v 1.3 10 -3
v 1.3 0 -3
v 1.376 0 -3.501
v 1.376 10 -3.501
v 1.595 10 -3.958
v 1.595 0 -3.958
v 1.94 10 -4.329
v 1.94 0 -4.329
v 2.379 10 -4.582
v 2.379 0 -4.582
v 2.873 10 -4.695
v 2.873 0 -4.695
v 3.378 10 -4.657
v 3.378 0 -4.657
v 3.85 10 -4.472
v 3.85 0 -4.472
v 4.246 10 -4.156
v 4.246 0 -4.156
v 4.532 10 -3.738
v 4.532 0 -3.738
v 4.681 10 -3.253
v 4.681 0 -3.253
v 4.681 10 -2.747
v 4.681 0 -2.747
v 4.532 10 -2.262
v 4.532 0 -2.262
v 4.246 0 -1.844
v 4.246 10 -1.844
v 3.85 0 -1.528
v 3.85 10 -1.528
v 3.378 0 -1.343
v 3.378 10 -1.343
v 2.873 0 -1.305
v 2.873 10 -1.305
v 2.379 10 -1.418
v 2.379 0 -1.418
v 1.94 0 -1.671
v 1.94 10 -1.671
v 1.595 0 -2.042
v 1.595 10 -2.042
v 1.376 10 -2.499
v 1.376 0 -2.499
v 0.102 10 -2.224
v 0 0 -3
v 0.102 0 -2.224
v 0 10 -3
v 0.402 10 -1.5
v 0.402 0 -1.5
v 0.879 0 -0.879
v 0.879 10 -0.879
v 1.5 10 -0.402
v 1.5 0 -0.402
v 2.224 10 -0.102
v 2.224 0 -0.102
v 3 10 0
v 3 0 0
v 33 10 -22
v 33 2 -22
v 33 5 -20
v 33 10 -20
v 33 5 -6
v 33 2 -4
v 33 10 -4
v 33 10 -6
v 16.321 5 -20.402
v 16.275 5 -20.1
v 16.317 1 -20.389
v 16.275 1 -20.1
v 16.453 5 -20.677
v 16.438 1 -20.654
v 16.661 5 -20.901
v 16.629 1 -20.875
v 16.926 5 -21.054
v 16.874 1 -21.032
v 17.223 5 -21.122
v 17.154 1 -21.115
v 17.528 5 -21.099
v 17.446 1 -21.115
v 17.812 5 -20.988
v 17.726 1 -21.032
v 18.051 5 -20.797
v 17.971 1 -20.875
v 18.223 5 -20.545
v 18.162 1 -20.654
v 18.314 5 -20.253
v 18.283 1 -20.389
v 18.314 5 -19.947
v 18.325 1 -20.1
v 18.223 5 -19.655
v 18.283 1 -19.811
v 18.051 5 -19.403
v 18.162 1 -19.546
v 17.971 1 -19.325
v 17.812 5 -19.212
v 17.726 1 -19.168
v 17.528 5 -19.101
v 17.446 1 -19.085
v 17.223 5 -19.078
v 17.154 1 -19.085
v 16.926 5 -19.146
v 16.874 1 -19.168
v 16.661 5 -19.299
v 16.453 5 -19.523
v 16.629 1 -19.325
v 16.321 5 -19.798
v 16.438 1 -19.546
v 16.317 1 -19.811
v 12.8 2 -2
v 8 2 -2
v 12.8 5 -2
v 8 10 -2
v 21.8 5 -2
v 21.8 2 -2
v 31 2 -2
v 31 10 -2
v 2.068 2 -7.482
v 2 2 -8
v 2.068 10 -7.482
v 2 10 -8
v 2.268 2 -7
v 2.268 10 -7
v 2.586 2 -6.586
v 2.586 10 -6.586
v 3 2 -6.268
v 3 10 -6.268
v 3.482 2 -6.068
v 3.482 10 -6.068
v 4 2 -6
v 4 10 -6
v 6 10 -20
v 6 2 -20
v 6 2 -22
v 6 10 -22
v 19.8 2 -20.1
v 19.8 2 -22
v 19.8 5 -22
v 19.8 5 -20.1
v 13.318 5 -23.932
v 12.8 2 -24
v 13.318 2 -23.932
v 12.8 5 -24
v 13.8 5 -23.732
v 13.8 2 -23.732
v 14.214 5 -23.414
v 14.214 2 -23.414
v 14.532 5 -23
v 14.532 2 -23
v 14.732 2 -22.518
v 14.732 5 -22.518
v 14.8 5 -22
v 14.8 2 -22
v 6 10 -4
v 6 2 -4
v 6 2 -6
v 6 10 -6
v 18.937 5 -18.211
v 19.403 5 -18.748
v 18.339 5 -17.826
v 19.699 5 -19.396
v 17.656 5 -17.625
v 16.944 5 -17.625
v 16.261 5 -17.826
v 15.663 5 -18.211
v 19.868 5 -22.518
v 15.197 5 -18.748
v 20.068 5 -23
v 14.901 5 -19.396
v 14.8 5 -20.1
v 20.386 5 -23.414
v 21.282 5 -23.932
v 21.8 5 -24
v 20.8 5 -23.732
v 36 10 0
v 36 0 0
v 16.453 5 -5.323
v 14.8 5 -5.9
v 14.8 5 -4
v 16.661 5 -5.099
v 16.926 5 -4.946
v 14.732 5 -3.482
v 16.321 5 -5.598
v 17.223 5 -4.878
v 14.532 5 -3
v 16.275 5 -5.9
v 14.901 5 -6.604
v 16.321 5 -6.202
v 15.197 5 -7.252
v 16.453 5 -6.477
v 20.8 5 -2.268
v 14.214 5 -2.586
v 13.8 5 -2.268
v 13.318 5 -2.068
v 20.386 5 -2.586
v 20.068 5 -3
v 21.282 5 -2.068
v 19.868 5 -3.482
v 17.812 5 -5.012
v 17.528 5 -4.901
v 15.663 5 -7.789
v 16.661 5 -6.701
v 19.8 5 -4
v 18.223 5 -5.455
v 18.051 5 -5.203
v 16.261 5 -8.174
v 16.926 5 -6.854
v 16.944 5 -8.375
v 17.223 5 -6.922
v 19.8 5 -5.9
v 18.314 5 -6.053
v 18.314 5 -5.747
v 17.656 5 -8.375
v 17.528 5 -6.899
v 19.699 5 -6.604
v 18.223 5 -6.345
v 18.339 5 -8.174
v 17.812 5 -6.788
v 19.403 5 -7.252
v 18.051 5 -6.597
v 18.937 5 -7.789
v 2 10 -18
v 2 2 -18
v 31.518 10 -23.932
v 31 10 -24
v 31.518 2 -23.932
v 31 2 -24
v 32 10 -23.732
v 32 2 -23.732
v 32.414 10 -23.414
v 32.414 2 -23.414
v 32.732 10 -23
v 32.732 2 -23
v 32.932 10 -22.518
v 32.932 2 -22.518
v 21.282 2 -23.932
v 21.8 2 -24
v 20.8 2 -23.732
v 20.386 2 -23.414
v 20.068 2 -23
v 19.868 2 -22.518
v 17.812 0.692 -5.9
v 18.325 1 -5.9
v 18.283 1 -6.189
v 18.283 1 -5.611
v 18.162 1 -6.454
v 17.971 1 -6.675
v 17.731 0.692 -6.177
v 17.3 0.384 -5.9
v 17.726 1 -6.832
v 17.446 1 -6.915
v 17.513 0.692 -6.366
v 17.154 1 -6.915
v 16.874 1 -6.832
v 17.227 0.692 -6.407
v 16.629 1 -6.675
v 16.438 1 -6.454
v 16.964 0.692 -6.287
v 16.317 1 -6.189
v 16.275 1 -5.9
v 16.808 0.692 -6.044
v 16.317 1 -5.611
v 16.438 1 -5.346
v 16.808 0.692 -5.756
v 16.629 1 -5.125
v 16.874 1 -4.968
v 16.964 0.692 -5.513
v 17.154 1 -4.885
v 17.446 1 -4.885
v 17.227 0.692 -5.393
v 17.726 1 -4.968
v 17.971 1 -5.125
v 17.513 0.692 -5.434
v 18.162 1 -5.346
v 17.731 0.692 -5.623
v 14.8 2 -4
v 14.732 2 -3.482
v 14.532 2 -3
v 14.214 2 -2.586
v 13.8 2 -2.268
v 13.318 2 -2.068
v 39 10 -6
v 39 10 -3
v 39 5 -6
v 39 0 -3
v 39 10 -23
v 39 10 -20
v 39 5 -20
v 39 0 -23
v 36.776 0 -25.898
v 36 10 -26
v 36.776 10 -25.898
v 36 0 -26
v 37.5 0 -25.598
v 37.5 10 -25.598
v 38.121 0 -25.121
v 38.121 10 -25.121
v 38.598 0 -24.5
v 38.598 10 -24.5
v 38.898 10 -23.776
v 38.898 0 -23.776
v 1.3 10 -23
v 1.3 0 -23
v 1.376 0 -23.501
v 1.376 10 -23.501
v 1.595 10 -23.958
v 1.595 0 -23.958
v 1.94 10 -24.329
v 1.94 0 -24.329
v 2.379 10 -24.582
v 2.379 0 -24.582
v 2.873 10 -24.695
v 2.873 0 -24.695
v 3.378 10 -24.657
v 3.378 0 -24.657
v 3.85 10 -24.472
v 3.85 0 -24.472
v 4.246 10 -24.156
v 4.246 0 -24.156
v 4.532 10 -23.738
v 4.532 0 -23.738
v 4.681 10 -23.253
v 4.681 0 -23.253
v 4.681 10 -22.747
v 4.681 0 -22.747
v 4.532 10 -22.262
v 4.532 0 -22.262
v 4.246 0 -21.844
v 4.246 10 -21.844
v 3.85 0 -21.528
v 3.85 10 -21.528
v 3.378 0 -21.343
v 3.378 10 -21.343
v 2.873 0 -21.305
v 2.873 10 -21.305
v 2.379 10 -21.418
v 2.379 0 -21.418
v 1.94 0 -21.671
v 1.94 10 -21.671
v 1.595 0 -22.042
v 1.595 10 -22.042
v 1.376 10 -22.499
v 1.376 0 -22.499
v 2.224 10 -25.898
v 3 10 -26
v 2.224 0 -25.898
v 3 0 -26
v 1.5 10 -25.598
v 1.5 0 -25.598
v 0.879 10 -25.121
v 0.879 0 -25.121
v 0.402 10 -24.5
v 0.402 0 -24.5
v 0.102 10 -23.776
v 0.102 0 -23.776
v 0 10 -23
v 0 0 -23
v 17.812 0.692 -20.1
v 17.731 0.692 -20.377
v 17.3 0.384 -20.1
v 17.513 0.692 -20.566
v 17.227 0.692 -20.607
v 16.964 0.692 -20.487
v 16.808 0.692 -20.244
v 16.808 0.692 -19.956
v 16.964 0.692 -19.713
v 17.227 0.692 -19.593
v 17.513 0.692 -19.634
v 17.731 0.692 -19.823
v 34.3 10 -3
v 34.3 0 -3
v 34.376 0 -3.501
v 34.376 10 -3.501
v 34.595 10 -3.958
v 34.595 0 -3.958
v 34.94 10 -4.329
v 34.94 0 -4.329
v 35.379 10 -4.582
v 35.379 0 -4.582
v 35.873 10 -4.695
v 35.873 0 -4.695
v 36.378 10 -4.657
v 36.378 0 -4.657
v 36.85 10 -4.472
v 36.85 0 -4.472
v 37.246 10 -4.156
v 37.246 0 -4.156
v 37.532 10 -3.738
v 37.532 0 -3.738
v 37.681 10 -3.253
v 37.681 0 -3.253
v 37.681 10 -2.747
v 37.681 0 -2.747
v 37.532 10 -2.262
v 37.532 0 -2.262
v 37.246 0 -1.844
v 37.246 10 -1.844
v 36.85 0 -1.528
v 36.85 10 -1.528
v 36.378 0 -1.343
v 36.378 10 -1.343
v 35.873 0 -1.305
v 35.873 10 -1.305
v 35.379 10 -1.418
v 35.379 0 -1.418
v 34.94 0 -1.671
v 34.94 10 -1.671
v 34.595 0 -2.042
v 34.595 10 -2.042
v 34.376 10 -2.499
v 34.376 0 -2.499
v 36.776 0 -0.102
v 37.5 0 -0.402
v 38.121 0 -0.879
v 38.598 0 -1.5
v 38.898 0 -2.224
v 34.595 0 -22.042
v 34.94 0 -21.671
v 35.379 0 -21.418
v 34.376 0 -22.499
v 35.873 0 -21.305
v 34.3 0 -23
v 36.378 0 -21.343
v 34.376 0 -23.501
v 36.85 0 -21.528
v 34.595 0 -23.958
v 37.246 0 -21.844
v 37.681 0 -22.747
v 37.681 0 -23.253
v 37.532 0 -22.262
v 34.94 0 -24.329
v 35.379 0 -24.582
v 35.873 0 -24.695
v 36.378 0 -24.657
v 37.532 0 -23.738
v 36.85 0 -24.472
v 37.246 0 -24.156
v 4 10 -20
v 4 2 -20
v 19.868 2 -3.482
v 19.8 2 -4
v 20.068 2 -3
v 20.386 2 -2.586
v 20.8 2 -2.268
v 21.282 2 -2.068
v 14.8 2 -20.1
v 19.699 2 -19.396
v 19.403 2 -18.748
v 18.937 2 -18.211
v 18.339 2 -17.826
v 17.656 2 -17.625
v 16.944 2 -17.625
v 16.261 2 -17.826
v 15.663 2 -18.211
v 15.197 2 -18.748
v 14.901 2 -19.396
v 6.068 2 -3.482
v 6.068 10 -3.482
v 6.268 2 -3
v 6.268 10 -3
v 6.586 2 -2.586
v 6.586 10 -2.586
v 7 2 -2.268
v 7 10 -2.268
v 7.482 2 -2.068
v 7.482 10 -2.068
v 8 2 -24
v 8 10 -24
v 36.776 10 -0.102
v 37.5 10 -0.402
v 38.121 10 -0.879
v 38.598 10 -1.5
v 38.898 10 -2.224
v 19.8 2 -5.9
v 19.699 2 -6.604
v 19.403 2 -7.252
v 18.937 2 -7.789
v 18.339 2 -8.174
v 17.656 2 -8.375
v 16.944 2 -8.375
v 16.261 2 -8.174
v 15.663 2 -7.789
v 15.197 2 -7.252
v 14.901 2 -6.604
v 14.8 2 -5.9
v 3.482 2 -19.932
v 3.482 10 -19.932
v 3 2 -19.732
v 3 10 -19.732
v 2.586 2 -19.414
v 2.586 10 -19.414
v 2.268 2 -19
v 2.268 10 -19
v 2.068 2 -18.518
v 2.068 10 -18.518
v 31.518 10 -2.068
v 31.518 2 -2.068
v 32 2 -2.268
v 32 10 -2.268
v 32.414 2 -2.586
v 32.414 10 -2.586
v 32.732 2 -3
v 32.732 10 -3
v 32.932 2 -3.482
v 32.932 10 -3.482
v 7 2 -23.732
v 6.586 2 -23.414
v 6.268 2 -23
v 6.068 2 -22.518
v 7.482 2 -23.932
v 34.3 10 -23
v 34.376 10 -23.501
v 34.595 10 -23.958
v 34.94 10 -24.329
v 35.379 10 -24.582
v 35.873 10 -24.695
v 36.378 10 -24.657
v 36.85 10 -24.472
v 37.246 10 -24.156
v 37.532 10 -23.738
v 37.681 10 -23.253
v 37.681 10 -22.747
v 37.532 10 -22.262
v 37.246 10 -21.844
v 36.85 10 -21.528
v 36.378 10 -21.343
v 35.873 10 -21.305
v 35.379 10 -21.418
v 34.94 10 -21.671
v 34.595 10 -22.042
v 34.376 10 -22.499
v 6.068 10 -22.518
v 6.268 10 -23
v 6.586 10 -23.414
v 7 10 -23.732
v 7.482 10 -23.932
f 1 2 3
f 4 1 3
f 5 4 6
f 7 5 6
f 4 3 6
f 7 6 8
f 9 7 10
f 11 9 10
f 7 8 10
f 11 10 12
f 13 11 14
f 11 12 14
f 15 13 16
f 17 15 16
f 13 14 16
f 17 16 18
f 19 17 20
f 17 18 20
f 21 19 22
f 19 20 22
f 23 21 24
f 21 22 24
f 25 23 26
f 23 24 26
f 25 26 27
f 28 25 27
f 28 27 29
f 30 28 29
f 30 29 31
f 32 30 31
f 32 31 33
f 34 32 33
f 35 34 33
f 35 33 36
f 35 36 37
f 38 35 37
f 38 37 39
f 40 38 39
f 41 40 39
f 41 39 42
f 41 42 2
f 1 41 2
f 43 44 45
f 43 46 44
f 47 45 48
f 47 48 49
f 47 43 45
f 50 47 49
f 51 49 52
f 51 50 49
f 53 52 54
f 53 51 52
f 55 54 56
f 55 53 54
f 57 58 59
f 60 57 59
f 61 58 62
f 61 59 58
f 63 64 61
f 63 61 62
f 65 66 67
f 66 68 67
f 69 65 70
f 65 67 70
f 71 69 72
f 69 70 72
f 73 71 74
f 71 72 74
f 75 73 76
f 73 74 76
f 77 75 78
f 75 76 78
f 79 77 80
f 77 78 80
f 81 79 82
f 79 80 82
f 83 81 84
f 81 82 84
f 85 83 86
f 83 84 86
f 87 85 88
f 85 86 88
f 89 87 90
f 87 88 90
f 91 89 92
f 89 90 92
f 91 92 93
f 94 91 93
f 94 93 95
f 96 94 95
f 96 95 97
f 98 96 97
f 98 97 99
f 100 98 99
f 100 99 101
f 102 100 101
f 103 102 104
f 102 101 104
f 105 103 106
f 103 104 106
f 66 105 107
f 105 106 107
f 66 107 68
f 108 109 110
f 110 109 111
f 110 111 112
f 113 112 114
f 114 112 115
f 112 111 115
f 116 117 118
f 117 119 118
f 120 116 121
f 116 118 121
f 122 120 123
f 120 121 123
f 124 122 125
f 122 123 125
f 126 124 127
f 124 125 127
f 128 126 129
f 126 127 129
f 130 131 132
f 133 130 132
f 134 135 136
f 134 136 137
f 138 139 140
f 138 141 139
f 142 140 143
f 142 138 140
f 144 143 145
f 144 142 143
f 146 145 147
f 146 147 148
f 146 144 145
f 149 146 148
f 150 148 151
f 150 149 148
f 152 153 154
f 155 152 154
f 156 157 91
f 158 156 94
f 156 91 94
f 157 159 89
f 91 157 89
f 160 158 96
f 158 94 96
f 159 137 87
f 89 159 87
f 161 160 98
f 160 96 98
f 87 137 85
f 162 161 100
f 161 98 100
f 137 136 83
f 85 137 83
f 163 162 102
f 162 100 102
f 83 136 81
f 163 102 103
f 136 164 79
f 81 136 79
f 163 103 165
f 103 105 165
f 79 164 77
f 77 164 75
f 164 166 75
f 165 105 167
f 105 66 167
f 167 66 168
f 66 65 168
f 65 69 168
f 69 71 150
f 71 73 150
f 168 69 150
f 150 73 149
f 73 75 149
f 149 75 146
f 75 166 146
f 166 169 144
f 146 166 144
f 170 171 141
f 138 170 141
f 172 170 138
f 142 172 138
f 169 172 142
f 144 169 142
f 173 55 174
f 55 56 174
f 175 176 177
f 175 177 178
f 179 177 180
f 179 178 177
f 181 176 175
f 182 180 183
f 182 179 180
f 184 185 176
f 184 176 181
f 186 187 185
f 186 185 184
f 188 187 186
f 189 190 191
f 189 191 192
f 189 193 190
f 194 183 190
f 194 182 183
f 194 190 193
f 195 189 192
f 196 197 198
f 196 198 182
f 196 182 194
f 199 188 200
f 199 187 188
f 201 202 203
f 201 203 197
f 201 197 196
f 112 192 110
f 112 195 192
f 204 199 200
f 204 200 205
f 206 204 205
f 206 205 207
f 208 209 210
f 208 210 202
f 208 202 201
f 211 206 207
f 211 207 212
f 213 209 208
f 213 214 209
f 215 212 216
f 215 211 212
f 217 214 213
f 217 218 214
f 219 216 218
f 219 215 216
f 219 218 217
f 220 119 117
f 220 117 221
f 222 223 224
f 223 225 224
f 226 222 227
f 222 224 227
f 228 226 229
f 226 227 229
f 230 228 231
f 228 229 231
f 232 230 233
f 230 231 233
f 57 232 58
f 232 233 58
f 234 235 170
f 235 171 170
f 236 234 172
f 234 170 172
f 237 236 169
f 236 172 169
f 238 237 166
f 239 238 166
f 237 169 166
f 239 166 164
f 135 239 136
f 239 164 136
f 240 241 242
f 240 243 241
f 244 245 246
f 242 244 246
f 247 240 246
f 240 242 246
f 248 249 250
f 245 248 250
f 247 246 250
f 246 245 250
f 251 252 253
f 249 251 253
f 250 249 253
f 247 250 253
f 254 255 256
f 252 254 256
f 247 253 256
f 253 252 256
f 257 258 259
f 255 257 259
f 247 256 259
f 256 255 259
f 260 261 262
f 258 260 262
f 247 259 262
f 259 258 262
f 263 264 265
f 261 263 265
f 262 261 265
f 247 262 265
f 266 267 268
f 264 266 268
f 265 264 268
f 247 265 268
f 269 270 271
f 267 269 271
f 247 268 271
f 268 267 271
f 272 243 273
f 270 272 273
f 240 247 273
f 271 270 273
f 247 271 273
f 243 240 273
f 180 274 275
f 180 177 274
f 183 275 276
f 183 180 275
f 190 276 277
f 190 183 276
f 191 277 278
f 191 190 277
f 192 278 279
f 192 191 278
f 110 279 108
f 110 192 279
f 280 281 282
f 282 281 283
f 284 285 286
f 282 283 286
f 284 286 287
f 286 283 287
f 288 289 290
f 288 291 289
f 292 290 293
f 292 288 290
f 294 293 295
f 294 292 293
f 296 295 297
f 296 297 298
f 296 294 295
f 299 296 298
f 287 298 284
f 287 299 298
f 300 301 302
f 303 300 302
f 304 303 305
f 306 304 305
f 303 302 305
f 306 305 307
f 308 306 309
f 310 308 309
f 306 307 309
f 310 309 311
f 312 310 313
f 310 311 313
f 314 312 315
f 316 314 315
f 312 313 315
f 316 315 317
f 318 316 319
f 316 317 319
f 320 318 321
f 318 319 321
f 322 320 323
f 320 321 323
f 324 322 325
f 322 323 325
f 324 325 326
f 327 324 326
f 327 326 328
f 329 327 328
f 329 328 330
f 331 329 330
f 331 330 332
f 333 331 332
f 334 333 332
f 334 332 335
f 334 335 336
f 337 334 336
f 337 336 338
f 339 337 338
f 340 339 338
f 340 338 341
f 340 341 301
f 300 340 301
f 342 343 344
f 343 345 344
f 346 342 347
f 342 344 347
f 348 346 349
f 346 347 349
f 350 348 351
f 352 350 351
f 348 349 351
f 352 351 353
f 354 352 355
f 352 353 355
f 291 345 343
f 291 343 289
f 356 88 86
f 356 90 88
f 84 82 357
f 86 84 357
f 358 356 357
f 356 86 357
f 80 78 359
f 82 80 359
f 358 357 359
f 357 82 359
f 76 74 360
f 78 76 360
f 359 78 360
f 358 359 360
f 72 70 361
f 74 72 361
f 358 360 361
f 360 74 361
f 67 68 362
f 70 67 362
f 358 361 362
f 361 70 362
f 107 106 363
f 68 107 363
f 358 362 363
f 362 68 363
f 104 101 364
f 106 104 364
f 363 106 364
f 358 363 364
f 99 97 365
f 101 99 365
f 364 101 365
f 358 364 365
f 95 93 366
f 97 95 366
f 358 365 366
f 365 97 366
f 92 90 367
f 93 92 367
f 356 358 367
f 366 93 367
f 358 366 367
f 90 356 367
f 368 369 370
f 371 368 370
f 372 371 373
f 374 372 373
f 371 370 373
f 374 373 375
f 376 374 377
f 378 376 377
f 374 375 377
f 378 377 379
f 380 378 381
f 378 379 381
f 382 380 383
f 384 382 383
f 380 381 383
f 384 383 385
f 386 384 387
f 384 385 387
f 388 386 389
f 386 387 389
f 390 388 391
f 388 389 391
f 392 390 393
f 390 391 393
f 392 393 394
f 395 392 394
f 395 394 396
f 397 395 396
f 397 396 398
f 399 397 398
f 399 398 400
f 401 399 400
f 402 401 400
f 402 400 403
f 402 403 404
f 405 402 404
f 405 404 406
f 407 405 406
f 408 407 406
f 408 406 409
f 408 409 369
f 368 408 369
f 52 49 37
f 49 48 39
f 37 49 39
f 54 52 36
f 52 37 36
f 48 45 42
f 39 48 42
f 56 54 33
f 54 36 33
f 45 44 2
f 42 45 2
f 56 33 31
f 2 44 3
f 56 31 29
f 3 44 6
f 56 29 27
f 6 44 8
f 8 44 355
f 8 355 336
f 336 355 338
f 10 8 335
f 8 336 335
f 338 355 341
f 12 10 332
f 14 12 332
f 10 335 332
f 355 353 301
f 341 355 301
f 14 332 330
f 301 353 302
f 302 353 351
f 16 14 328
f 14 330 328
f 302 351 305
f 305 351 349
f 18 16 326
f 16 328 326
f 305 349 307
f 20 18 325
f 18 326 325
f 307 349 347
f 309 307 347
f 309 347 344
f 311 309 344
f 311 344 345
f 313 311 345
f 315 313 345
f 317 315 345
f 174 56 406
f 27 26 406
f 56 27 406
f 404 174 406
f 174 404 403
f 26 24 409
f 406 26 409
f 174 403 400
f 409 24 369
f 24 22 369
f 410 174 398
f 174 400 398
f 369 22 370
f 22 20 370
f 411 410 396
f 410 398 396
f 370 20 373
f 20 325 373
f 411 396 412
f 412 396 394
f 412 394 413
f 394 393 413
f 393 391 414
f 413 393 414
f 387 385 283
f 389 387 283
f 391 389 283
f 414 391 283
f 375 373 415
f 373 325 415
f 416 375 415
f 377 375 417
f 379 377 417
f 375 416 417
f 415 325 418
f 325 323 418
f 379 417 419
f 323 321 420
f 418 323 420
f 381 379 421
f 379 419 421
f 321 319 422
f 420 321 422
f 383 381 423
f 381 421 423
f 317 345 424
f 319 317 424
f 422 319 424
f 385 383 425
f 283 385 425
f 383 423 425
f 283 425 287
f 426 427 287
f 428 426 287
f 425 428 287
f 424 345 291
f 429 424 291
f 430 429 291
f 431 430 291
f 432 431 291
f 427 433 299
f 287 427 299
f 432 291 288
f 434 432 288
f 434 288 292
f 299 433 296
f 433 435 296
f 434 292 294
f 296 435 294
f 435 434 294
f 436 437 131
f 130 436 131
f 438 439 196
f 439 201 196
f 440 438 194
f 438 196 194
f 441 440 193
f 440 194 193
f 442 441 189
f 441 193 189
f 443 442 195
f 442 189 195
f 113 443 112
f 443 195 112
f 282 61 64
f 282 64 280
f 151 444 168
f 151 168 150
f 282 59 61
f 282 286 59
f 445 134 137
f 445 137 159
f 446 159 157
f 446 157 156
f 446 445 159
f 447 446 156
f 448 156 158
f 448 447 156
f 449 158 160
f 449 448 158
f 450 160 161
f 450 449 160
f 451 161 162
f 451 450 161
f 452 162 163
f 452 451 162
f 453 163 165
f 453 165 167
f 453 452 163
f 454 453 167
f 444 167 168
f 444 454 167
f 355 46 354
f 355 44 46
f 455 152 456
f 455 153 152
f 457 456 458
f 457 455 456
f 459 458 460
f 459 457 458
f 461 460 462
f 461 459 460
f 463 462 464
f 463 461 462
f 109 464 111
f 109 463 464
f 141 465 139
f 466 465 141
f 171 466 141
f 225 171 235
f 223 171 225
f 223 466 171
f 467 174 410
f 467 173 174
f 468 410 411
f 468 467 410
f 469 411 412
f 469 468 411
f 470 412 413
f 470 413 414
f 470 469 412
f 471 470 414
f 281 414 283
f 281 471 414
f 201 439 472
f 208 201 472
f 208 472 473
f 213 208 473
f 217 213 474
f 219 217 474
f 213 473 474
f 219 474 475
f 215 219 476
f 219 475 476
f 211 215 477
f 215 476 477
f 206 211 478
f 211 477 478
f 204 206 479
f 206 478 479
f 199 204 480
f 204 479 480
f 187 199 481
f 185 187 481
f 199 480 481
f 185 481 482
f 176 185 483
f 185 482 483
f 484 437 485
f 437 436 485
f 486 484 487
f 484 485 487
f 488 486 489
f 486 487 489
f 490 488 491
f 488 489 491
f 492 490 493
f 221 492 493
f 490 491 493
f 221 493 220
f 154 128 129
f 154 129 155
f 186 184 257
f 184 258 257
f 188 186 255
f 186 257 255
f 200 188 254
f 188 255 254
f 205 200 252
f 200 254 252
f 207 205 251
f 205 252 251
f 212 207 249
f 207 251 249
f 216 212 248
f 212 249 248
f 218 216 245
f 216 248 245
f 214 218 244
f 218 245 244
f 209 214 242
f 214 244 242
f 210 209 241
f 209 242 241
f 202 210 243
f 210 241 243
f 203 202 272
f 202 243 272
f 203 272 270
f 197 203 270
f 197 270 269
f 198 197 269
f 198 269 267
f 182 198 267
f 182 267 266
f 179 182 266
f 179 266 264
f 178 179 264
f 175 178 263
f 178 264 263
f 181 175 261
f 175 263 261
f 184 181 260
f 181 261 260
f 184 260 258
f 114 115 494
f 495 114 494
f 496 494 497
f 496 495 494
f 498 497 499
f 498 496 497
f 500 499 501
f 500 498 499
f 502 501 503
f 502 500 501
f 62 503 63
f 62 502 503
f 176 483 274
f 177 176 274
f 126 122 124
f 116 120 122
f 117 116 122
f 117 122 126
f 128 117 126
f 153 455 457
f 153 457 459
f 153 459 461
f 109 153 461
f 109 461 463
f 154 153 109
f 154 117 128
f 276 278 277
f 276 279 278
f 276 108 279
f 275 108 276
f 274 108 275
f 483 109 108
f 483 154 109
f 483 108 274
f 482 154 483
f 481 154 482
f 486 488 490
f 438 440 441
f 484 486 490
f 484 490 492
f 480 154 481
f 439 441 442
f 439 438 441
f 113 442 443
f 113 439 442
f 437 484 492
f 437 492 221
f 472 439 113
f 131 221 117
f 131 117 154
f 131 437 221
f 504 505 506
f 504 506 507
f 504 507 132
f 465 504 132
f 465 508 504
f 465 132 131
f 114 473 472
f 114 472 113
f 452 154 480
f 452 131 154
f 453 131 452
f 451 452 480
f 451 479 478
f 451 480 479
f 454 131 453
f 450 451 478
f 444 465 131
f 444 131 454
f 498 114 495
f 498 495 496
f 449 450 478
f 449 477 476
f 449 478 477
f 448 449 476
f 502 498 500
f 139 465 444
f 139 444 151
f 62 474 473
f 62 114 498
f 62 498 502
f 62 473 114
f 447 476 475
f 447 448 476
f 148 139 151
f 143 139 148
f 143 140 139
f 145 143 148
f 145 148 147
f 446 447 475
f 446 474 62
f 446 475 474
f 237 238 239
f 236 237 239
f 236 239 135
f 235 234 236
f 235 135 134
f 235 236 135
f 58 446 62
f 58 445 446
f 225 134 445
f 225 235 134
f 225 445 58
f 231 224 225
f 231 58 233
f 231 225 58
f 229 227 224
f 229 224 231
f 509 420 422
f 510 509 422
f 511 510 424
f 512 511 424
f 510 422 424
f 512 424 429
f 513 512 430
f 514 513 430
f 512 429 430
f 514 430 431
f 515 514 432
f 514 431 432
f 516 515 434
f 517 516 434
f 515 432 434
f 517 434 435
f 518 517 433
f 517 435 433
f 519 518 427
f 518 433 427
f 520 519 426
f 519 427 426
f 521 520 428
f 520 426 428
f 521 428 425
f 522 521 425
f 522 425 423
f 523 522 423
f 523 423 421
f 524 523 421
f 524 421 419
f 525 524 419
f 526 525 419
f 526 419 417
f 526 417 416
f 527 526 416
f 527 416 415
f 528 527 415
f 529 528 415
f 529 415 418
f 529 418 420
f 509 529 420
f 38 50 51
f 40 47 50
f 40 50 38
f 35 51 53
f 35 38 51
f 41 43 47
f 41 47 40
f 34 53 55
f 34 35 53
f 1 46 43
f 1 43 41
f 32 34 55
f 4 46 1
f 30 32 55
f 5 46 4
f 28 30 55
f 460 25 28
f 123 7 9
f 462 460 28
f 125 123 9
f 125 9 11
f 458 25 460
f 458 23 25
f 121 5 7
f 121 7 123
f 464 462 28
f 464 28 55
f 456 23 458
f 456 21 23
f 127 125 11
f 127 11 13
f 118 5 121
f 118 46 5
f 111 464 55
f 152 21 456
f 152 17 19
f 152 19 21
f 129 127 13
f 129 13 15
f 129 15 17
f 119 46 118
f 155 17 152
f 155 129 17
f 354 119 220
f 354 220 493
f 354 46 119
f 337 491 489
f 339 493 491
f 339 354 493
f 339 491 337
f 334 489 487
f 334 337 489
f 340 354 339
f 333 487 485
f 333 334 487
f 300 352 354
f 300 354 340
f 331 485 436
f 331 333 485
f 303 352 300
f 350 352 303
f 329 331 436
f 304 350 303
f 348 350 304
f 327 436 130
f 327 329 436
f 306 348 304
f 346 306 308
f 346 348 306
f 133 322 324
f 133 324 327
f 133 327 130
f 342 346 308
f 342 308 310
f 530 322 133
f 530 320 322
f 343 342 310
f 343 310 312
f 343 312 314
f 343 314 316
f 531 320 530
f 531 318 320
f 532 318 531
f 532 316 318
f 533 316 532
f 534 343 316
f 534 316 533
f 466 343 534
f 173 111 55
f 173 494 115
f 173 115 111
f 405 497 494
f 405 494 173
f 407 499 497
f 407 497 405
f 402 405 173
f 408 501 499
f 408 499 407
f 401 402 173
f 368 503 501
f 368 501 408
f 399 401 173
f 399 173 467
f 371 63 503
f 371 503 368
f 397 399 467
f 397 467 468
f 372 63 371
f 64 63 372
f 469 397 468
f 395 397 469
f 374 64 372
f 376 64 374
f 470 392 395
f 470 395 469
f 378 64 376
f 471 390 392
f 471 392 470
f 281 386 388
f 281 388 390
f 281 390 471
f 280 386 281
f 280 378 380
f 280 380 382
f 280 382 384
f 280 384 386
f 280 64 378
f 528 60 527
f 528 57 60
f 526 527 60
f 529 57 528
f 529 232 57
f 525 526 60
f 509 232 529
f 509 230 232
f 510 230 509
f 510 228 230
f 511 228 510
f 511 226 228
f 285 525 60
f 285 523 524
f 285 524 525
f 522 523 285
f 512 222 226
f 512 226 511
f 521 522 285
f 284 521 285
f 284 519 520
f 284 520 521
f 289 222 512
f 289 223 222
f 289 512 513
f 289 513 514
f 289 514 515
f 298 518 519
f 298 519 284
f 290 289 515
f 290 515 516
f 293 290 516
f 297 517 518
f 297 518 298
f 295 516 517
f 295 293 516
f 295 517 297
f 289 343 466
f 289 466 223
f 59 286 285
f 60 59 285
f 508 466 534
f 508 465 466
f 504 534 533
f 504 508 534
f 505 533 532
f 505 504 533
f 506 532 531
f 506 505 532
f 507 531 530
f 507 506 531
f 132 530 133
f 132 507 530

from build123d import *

# Parameters (mm, degrees)
SKETCH_1_W          = 39
SKETCH_1_H          = 26
EXTRUDE_1_DEPTH     = 10
SKETCH_2_W          = 35
SKETCH_2_H          = 22
CUT_EXTRUDE_1_DEPTH = 8
EXTRUDE_2_DEPTH     = 3
M2_5X0_451_D        = 2.05
M2_5X0_451_DEPTH    = 4
M2_5X0_451_TIP      = 0.615882135
SKETCH_6_W          = 6
SKETCH_6_H          = 6
EXTRUDE_3_DEPTH     = 8
HOLE_WIZARD_M32_D   = 3.4
CUT_EXTRUDE_2_REACH = 49.927
SKETCH_14_W         = 14
SKETCH_14_H         = 5
SKETCH_15_W         = 14
SKETCH_15_H         = 3
EXTRUDE_4_DEPTH     = 4
FILLET_1_R          = 2
FILLET_2_R          = 3


with BuildPart() as part:
    # Эскиз1 → Бобышка-Вытянуть1 (new body)
    with BuildSketch(Plane(origin=(0, 0, 0), x_dir=(1, 0, 0), z_dir=(0, 1, 0))):
        with Locations((19.5, 13)):
            Rectangle(SKETCH_1_W, SKETCH_1_H)
    extrude(amount=EXTRUDE_1_DEPTH)

    # Эскиз2 → Вырез-Вытянуть1 (cut)
    with BuildSketch(Plane(origin=(0, 10, 0), x_dir=(1, 0, 0), z_dir=(0, 1, 0))):
        with Locations((19.5, 13)):
            Rectangle(SKETCH_2_W, SKETCH_2_H)
    extrude(amount=-CUT_EXTRUDE_1_DEPTH, mode=Mode.SUBTRACT)

    # Эскиз3 → Бобышка-Вытянуть2 (add)
    with BuildSketch(Plane(origin=(0, 2, 0), x_dir=(1, 0, 0), z_dir=(0, 1, 0))):
        with BuildLine():
            Line((14.8, 20.1), (14.8, 24))
            Line((14.8, 24), (19.8, 24))
            Line((19.8, 24), (19.8, 20.1))
            ThreePointArc((19.8, 20.1), (17.3, 17.6), (14.8, 20.1))
        make_face()
        with BuildLine():
            Line((19.8, 2), (19.8, 5.9))
            ThreePointArc((19.8, 5.9), (17.3, 8.4), (14.8, 5.9))
            Line((14.8, 5.9), (14.8, 2))
            Line((14.8, 2), (19.8, 2))
        make_face()
    extrude(amount=EXTRUDE_2_DEPTH)

    # Отверстие обработанное метчиком M2.5x0.451
    with Locations(Plane(origin=(0, 5, 0), x_dir=(1, 0, 0), z_dir=(0, 1, 0))):
        with Locations((17.3, 20.1), (17.3, 5.9)):
            Hole(M2_5X0_451_D / 2, depth=M2_5X0_451_DEPTH)
            with Locations((0, 0, -(M2_5X0_451_DEPTH + M2_5X0_451_TIP / 2))):  # 118° drill point
                Cone(0, M2_5X0_451_D / 2, M2_5X0_451_TIP, mode=Mode.SUBTRACT)

    # Эскиз6 → Бобышка-Вытянуть3 (add, through all)
    with BuildSketch(Plane(origin=(0, 2, 0), x_dir=(1, 0, 0), z_dir=(0, 1, 0))):
        with Locations((3, 3)):
            Rectangle(SKETCH_6_W, SKETCH_6_H)
        with Locations((36, 23)):
            Rectangle(SKETCH_6_W, SKETCH_6_H)
        with Locations((36, 3)):
            Rectangle(SKETCH_6_W, SKETCH_6_H)
        with Locations((3, 23)):
            Rectangle(SKETCH_6_W, SKETCH_6_H)
    extrude(amount=EXTRUDE_3_DEPTH)

    # Отверстие с зазором M32 (through all)
    with Locations(Plane(origin=(0, 10, 0), x_dir=(1, 0, 0), z_dir=(0, 1, 0))):
        with Locations((3, 23), (36, 23), (36, 3), (3, 3)):
            Hole(HOLE_WIZARD_M32_D / 2)

    # Эскиз14 → Вырез-Вытянуть2 (cut, up to next)
    with BuildSketch(Plane(origin=(39, 0, 0), x_dir=(0, 0, -1), z_dir=(1, 0, 0)), mode=Mode.PRIVATE) as cut_extrude_2_sk1:
        with Locations((13, 7.5)):
            Rectangle(SKETCH_14_W, SKETCH_14_H)
    cut_extrude_2_tool1 = extrude(cut_extrude_2_sk1.sketch, amount=-CUT_EXTRUDE_2_REACH, mode=Mode.PRIVATE) & part.part
    add(cut_extrude_2_tool1.solids().sort_by_distance((39, 7.5, -13))[0], mode=Mode.SUBTRACT)

    # Эскиз15 → Бобышка-Вытянуть4 (add)
    with BuildSketch(Plane.ZY.offset(-37)):
        with Locations((-13, 3.5)):
            Rectangle(SKETCH_15_W, SKETCH_15_H)
    extrude(amount=EXTRUDE_4_DEPTH)

    # Скругление1
    fillet_1_edges = [part.edges().sort_by_distance(p)[0] for p in [
        (33, 6, -2),
        (2, 6, -20),
        (6, 6, -24),
        (19.8, 3.5, -24),
        (14.8, 3.5, -24),
        (14.8, 3.5, -2),
        (19.8, 3.5, -2),
        (2, 6, -6),
        (6, 6, -2),
        (33, 6, -24),
    ]]
    fillet(fillet_1_edges, radius=FILLET_1_R)

    # Скругление2
    fillet_2_edges = [part.edges().sort_by_distance(p)[0] for p in [
        (0, 5, -26),
        (39, 5, -26),
        (39, 5, 0),
        (0, 5, 0),
    ]]
    fillet(fillet_2_edges, radius=FILLET_2_R)


solid = part.part
